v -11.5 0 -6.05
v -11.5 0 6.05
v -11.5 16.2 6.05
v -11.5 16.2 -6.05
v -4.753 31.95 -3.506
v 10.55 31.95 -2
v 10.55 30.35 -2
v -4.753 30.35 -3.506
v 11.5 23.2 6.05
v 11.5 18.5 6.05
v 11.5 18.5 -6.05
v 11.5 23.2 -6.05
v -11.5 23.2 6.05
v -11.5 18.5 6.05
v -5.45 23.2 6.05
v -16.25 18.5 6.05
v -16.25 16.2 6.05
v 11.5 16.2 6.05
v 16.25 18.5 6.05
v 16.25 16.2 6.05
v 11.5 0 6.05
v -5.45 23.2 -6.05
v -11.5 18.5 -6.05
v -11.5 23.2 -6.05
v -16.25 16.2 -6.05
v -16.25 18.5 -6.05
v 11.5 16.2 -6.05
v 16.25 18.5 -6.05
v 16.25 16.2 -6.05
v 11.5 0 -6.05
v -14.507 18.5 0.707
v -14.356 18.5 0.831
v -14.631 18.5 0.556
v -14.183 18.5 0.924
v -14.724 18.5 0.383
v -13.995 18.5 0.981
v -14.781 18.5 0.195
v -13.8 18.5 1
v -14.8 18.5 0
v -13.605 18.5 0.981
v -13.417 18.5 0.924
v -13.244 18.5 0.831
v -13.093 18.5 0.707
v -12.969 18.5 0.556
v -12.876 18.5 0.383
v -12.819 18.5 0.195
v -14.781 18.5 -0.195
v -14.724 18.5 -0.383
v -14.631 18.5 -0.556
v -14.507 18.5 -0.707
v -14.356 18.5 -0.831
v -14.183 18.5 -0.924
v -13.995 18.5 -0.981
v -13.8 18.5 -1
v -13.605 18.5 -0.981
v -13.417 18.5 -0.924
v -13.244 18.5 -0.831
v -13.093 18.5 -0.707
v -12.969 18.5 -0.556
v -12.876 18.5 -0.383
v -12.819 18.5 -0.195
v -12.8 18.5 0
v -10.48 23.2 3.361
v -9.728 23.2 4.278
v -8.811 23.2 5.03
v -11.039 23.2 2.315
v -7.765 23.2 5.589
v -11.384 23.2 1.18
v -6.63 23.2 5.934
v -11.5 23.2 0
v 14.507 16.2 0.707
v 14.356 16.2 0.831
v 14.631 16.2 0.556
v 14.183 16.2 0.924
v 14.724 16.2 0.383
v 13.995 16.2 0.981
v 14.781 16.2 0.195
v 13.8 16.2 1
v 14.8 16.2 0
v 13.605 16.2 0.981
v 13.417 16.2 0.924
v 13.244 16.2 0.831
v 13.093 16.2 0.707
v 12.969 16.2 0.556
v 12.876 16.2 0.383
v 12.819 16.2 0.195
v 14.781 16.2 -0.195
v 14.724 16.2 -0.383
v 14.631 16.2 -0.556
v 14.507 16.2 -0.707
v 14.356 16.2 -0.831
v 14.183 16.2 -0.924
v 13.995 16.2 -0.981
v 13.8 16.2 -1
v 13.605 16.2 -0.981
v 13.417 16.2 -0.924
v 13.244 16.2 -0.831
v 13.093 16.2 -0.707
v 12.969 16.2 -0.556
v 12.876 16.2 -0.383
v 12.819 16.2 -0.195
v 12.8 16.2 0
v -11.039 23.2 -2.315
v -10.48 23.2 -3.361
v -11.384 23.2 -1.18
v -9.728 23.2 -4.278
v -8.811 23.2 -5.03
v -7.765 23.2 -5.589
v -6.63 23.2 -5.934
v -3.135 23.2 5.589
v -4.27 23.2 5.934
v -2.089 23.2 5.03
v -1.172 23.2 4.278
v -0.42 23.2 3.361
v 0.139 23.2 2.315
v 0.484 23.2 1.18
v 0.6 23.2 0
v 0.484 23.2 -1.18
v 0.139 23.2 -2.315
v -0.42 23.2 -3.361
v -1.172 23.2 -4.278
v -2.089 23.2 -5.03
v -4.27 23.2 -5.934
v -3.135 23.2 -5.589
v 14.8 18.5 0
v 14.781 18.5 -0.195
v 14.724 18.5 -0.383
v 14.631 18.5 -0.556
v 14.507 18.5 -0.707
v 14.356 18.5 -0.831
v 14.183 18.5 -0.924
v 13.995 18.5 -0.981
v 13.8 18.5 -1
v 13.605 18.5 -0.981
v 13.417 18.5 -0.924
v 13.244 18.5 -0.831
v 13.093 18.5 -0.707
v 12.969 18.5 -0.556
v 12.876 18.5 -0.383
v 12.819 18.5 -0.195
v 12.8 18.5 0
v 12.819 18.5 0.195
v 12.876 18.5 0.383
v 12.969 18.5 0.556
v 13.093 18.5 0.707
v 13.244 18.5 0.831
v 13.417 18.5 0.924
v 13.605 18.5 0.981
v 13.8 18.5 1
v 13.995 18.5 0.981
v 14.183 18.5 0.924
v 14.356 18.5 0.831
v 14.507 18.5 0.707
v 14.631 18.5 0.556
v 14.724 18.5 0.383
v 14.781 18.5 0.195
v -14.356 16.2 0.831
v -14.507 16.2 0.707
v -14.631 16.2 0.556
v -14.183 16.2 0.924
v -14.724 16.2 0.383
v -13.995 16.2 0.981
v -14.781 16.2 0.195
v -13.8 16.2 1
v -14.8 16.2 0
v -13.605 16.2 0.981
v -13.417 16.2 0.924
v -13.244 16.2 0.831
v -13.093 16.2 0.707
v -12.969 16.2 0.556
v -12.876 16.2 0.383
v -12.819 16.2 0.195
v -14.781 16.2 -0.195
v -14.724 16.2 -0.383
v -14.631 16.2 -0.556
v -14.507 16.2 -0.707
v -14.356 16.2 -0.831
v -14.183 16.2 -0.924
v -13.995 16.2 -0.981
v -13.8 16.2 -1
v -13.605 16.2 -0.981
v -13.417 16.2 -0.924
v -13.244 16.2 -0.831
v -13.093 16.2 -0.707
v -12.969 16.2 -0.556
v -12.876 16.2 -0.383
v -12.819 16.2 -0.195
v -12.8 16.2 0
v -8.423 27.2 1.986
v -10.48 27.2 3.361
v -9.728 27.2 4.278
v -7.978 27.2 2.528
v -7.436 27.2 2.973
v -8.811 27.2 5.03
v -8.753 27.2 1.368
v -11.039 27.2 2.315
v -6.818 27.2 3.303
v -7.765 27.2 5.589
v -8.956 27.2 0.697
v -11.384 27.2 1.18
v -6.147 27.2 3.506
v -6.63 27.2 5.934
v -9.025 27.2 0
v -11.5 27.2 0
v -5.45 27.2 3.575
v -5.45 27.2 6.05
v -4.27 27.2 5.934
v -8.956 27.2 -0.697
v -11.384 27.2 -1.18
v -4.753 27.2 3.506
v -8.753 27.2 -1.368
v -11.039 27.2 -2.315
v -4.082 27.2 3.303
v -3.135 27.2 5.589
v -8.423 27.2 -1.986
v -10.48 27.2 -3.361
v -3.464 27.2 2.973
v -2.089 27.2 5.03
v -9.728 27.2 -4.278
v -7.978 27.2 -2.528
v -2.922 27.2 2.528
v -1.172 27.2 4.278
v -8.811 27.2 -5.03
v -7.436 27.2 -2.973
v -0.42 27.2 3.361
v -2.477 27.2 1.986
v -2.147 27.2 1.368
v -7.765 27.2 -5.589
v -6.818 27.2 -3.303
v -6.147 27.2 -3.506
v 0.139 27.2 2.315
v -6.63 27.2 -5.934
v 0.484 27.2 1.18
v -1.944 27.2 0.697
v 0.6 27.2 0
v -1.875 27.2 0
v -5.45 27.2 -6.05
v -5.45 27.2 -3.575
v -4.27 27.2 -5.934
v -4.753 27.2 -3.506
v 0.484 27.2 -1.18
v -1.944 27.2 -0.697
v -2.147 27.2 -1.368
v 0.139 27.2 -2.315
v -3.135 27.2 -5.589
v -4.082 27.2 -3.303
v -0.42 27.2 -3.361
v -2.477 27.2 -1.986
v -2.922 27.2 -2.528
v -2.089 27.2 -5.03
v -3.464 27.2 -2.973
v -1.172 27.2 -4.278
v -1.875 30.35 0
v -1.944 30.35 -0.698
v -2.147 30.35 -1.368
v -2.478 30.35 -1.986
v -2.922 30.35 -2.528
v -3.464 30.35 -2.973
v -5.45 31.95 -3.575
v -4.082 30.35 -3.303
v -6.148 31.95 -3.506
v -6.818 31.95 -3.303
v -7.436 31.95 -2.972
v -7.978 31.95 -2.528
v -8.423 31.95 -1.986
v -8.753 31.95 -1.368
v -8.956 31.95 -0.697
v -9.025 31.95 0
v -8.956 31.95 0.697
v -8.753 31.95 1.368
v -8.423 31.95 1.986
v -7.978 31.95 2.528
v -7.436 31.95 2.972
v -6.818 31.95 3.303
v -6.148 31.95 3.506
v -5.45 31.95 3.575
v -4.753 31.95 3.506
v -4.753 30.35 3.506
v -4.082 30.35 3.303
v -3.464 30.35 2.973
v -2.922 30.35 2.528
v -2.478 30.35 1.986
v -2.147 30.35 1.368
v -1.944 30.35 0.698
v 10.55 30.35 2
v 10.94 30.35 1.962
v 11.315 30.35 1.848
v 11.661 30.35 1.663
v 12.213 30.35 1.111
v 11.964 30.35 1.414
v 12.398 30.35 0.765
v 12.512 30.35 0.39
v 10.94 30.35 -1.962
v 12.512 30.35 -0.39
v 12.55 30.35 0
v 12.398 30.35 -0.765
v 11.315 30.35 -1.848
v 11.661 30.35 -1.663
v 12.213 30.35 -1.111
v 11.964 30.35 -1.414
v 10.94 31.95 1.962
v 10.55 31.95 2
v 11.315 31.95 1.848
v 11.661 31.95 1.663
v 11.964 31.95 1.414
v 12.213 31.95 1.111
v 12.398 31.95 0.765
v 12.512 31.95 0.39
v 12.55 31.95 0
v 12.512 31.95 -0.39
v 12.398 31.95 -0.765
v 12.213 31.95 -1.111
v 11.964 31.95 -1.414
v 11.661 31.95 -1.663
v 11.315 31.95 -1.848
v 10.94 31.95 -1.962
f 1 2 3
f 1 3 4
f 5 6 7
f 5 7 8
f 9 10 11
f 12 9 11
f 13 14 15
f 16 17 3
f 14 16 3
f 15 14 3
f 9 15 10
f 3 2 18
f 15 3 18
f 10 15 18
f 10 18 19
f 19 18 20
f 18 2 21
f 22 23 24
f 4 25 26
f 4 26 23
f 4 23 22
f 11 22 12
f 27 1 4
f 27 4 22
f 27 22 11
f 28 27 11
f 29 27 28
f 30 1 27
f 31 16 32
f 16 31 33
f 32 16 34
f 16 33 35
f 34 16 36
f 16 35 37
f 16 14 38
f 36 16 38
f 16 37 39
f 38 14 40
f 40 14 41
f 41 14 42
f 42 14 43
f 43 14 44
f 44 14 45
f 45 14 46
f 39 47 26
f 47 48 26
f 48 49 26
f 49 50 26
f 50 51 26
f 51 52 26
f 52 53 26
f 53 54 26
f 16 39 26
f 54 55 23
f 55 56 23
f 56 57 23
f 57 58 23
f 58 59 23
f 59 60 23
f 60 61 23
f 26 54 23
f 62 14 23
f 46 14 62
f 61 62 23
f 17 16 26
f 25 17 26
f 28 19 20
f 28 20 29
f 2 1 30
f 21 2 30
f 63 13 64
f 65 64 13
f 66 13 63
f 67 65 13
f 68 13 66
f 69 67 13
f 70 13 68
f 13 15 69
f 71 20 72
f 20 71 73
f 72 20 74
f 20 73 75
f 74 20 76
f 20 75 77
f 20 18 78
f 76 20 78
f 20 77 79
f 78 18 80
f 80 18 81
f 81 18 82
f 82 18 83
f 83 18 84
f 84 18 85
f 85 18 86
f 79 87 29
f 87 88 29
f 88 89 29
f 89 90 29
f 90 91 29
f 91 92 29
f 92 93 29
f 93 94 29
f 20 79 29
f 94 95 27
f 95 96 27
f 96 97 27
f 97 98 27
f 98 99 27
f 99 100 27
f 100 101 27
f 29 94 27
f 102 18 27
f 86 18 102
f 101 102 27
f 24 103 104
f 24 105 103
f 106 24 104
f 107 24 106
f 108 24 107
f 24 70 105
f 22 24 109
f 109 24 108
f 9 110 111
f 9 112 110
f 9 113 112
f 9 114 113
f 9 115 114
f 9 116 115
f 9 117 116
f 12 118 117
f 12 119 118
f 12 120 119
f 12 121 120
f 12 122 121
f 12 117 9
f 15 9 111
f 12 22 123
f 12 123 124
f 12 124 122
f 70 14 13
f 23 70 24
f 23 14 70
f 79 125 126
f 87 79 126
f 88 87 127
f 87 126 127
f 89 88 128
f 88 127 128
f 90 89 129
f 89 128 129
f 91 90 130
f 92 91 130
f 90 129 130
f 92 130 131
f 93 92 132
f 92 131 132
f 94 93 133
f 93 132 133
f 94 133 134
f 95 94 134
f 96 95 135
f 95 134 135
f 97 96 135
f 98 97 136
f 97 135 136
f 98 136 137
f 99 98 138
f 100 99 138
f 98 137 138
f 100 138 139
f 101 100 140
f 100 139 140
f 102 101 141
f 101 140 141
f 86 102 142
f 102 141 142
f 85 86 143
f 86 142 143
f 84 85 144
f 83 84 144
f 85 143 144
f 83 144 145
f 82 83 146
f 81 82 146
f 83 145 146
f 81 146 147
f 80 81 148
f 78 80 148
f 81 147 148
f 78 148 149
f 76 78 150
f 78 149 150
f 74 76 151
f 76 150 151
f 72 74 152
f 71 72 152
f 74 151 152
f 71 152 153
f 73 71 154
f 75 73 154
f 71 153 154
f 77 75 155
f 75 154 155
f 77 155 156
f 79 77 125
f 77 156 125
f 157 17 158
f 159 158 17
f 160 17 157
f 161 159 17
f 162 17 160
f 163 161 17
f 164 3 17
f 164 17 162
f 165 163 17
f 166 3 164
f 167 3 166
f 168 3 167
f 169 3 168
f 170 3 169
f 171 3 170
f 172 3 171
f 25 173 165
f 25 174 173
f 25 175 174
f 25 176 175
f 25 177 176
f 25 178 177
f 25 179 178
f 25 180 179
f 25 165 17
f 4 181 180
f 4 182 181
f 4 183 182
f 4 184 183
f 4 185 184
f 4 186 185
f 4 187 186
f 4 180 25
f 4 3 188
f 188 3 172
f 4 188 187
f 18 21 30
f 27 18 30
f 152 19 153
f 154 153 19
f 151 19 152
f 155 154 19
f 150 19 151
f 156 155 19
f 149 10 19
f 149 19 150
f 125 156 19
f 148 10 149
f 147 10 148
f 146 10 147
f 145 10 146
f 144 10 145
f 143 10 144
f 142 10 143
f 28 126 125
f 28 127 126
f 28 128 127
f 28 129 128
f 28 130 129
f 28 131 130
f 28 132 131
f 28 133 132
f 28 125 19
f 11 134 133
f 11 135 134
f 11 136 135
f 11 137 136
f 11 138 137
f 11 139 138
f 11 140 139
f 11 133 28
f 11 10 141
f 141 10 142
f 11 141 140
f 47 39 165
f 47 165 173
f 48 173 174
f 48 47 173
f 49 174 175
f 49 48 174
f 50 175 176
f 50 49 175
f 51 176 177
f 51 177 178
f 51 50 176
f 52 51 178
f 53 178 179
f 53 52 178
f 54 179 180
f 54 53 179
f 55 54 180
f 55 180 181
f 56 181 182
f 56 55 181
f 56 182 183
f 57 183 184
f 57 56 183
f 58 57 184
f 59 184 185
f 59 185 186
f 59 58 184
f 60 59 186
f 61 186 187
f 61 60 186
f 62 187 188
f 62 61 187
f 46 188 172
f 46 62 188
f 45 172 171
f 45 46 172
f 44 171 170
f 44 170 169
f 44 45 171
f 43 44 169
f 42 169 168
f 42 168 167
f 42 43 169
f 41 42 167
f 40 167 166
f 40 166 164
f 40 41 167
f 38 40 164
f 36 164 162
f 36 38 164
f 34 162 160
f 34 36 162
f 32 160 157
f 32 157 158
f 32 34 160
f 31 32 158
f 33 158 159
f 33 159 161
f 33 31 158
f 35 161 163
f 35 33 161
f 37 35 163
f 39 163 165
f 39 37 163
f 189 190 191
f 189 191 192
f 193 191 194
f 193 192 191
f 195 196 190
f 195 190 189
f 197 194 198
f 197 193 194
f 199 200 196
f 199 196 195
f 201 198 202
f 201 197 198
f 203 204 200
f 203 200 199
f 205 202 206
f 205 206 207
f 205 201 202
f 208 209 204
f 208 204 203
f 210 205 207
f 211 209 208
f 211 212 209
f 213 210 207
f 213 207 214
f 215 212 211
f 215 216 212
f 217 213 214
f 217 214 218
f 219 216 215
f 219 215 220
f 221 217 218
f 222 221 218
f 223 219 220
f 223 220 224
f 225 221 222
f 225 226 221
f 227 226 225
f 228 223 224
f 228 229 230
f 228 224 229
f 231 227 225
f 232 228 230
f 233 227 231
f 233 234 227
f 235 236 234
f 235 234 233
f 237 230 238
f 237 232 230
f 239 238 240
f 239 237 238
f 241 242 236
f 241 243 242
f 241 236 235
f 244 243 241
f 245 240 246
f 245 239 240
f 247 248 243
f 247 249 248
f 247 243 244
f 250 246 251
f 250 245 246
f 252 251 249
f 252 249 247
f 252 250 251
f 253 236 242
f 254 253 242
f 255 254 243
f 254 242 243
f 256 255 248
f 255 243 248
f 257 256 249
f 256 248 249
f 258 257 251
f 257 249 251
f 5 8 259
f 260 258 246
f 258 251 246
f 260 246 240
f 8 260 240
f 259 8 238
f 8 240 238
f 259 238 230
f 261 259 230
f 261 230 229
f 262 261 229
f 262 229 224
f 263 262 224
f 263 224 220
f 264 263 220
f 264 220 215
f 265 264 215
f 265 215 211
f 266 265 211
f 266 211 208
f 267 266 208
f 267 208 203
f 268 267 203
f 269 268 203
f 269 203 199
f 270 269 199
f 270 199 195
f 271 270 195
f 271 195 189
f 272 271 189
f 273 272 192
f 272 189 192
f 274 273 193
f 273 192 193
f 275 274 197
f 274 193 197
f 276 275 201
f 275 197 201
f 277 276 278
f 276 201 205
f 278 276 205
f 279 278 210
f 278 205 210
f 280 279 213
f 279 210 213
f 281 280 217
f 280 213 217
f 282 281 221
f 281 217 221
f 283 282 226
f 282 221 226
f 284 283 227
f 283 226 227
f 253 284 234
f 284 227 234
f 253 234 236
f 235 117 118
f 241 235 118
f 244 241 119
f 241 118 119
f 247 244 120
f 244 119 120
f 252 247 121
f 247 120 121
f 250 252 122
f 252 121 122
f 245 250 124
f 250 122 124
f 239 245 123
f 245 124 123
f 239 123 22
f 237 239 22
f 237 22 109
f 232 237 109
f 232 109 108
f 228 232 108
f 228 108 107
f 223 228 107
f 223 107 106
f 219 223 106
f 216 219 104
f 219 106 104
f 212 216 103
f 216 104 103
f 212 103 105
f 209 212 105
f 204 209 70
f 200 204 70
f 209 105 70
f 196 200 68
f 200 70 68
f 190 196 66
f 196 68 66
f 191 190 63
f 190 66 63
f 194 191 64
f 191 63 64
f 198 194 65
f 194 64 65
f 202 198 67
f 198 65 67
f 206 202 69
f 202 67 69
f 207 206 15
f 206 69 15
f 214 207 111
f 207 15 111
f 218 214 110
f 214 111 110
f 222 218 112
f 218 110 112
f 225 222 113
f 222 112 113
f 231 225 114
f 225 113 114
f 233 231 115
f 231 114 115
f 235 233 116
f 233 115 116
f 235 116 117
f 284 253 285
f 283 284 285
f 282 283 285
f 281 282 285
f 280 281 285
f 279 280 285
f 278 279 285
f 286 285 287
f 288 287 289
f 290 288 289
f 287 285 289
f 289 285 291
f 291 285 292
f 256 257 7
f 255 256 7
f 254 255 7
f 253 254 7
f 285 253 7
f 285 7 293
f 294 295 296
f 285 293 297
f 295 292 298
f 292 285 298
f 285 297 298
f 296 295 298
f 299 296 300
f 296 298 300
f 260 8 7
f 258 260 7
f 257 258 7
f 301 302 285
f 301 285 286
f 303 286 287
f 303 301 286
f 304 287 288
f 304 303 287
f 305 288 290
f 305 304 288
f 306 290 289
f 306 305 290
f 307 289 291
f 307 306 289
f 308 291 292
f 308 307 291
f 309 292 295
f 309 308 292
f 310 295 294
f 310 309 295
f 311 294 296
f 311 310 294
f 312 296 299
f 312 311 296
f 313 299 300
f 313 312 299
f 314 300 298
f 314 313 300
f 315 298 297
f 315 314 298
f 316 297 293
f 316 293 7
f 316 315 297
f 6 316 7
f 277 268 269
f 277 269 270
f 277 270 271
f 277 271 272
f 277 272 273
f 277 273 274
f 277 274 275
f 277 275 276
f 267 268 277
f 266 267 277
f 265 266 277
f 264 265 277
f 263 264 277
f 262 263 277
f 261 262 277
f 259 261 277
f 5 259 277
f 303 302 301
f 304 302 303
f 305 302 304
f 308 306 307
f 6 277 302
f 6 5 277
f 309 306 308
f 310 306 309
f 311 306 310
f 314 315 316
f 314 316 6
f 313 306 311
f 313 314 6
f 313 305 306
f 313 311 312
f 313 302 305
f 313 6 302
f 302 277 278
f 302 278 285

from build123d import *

# Parameters (mm, degrees)
SKETCH1_W           = 23
SKETCH1_H           = 12.1
BOSS_EXTRUDE1_DEPTH = 23.2
SKETCH2_W           = 12.1
SKETCH2_H           = 2.3
BOSS_EXTRUDE2_DEPTH = 4.75
SKETCH3_R           = 1
CUT_EXTRUDE1_DEPTH  = 2.3
SKETCH4_R           = 6.05
BOSS_EXTRUDE3_DEPTH = 4
SKETCH5_R           = 3.575
BOSS_EXTRUDE4_DEPTH = 4.75
BOSS_EXTRUDE5_DEPTH = 1.6


with BuildPart() as part:
    # Sketch1 → Boss-Extrude1 (new body)
    with BuildSketch(Plane(origin=(0, 0, 0), x_dir=(1, 0, 0), z_dir=(0, 1, 0))):
        Rectangle(SKETCH1_W, SKETCH1_H)
    extrude(amount=BOSS_EXTRUDE1_DEPTH)

    # Sketch2 → Boss-Extrude2 (add)
    with BuildSketch(Plane(origin=(11.5, 0, 0), x_dir=(0, 0, -1), z_dir=(1, 0, 0))):
        with Locations((0, 17.35)):
            Rectangle(SKETCH2_W, SKETCH2_H)
    boss_extrude2 = extrude(amount=BOSS_EXTRUDE2_DEPTH)

    # Sketch3 → Cut-Extrude1 (cut)
    with BuildSketch(Plane(origin=(0, 18.5, 0), x_dir=(1, 0, 0), z_dir=(0, 1, 0))):
        with Locations((13.8, 0)):
            Circle(SKETCH3_R)
    cut_extrude1 = extrude(amount=-CUT_EXTRUDE1_DEPTH, mode=Mode.SUBTRACT)

    # Mirror1: Boss-Extrude2, Cut-Extrude1 across plane
    add(boss_extrude2.mirror(Plane(origin=(0, 0, 0), x_dir=(0, 0, 1), z_dir=(1, 0, 0))))
    add(cut_extrude1.mirror(Plane(origin=(0, 0, 0), x_dir=(0, 0, 1), z_dir=(1, 0, 0))), mode=Mode.SUBTRACT)

    # Sketch4 → Boss-Extrude3 (add)
    with BuildSketch(Plane(origin=(0, 23.2, 0), x_dir=(1, 0, 0), z_dir=(0, 1, 0))):
        with Locations((-5.45, 0)):
            Circle(SKETCH4_R)
    extrude(amount=BOSS_EXTRUDE3_DEPTH)

    # Sketch5 → Boss-Extrude4 (add)
    with BuildSketch(Plane(origin=(0, 27.2, 0), x_dir=(1, 0, 0), z_dir=(0, 1, 0))):
        with Locations((-5.45, 0)):
            Circle(SKETCH5_R)
    extrude(amount=BOSS_EXTRUDE4_DEPTH)

    # Sketch7 → Boss-Extrude5 (add)
    with BuildSketch(Plane(origin=(0, 31.95, 0), x_dir=(1, 0, 0), z_dir=(0, 1, 0))):
        with BuildLine():
            Line((10.55, 2), (-4.752926477, 3.506381825))
            ThreePointArc((-4.752926477, 3.506381825), (-2.68660871, 2.26810352), (-1.875, 0))
            ThreePointArc((-1.875, 0), (-2.68660871, -2.26810352), (-4.752926477, -3.506381825))
            Line((-4.752926477, -3.506381825), (10.55, -2))
            ThreePointArc((10.55, -2), (12.55, 0), (10.55, 2))
        make_face()
    extrude(amount=-BOSS_EXTRUDE5_DEPTH)


solid = part.part
